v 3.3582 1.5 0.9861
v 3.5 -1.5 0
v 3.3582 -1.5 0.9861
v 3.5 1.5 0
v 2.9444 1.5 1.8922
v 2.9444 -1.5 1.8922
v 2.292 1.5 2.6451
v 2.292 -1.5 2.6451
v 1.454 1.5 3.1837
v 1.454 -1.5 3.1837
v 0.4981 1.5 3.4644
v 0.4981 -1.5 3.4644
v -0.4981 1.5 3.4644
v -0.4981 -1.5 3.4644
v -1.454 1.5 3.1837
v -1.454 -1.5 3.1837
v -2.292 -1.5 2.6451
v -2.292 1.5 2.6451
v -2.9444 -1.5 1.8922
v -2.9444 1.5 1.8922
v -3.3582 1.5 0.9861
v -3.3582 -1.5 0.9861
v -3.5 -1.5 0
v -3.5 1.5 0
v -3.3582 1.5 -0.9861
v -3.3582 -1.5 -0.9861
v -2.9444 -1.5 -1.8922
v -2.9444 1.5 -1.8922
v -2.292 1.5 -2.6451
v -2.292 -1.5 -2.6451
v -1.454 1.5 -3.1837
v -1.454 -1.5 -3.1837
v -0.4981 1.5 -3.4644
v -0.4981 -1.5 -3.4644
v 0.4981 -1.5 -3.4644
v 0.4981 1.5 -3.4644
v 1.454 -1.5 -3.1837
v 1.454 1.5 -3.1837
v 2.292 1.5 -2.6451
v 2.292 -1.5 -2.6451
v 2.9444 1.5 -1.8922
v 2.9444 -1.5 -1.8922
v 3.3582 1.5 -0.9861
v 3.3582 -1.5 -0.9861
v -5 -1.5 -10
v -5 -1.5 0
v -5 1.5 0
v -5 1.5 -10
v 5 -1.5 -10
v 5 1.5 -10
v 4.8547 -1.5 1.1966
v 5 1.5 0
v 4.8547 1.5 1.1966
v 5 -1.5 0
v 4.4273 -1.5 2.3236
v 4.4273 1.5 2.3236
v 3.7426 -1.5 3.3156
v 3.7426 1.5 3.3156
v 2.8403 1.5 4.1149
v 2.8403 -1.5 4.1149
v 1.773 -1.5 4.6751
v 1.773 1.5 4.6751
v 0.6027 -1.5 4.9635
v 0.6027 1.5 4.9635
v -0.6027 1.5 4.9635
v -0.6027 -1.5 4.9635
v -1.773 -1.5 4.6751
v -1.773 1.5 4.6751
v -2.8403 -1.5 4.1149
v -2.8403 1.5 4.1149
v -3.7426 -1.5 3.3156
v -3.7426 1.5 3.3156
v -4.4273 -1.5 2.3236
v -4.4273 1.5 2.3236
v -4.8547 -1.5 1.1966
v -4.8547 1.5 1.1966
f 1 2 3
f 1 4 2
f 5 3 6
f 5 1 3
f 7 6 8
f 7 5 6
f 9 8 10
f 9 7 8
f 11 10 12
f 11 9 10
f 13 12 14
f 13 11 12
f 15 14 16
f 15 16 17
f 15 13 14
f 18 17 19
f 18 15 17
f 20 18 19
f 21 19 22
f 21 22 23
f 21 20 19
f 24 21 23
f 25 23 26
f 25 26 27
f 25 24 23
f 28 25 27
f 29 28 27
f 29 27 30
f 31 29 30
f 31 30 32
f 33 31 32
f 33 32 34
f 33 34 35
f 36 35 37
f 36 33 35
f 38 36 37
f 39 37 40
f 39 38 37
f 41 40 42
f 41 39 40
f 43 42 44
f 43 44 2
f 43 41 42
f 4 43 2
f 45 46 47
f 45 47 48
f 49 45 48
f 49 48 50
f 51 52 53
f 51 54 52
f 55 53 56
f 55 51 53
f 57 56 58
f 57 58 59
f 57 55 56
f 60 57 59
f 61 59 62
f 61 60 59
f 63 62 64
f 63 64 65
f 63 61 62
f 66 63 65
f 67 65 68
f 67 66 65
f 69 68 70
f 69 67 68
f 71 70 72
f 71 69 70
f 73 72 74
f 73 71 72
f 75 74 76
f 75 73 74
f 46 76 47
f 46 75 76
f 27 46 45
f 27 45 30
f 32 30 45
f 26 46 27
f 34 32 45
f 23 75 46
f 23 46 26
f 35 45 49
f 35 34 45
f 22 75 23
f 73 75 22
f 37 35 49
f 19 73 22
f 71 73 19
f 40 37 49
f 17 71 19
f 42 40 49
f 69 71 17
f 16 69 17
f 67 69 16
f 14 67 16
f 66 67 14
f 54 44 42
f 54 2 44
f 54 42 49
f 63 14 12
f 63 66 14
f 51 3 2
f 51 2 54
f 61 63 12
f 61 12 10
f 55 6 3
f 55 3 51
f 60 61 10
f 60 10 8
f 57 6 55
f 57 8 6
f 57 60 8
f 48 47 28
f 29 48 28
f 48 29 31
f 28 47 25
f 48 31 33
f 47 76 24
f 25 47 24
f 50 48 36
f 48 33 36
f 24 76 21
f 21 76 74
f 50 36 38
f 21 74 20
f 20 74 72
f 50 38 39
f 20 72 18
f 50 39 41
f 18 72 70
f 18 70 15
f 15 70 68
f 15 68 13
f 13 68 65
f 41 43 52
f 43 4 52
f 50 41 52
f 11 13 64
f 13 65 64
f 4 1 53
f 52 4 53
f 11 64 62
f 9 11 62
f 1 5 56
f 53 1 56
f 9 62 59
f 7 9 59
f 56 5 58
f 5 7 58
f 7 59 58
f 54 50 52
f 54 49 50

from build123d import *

# Parameters (mm, degrees)
F0_R     = 3.5
F1_DEPTH = 1.5


with BuildPart() as f1:
    # F0 (on Front) → F1 (new body, symmetric)
    with BuildSketch(Plane.XZ):
        with BuildLine():
            ThreePointArc((-5, 0), (0, -5), (5, 0))
            ThreePointArc((5, 0), (0, 5), (-5, 0))
        make_face()
        Circle(F0_R, mode=Mode.SUBTRACT)
        with BuildLine():
            Line((5, -10), (5, 0))
            ThreePointArc((5, 0), (0, -5), (-5, 0))
            Line((-5, 0), (-5, -10))
            Line((-5, -10), (5, -10))
        make_face()
    extrude(amount=F1_DEPTH, both=True)


solid = f1.part
